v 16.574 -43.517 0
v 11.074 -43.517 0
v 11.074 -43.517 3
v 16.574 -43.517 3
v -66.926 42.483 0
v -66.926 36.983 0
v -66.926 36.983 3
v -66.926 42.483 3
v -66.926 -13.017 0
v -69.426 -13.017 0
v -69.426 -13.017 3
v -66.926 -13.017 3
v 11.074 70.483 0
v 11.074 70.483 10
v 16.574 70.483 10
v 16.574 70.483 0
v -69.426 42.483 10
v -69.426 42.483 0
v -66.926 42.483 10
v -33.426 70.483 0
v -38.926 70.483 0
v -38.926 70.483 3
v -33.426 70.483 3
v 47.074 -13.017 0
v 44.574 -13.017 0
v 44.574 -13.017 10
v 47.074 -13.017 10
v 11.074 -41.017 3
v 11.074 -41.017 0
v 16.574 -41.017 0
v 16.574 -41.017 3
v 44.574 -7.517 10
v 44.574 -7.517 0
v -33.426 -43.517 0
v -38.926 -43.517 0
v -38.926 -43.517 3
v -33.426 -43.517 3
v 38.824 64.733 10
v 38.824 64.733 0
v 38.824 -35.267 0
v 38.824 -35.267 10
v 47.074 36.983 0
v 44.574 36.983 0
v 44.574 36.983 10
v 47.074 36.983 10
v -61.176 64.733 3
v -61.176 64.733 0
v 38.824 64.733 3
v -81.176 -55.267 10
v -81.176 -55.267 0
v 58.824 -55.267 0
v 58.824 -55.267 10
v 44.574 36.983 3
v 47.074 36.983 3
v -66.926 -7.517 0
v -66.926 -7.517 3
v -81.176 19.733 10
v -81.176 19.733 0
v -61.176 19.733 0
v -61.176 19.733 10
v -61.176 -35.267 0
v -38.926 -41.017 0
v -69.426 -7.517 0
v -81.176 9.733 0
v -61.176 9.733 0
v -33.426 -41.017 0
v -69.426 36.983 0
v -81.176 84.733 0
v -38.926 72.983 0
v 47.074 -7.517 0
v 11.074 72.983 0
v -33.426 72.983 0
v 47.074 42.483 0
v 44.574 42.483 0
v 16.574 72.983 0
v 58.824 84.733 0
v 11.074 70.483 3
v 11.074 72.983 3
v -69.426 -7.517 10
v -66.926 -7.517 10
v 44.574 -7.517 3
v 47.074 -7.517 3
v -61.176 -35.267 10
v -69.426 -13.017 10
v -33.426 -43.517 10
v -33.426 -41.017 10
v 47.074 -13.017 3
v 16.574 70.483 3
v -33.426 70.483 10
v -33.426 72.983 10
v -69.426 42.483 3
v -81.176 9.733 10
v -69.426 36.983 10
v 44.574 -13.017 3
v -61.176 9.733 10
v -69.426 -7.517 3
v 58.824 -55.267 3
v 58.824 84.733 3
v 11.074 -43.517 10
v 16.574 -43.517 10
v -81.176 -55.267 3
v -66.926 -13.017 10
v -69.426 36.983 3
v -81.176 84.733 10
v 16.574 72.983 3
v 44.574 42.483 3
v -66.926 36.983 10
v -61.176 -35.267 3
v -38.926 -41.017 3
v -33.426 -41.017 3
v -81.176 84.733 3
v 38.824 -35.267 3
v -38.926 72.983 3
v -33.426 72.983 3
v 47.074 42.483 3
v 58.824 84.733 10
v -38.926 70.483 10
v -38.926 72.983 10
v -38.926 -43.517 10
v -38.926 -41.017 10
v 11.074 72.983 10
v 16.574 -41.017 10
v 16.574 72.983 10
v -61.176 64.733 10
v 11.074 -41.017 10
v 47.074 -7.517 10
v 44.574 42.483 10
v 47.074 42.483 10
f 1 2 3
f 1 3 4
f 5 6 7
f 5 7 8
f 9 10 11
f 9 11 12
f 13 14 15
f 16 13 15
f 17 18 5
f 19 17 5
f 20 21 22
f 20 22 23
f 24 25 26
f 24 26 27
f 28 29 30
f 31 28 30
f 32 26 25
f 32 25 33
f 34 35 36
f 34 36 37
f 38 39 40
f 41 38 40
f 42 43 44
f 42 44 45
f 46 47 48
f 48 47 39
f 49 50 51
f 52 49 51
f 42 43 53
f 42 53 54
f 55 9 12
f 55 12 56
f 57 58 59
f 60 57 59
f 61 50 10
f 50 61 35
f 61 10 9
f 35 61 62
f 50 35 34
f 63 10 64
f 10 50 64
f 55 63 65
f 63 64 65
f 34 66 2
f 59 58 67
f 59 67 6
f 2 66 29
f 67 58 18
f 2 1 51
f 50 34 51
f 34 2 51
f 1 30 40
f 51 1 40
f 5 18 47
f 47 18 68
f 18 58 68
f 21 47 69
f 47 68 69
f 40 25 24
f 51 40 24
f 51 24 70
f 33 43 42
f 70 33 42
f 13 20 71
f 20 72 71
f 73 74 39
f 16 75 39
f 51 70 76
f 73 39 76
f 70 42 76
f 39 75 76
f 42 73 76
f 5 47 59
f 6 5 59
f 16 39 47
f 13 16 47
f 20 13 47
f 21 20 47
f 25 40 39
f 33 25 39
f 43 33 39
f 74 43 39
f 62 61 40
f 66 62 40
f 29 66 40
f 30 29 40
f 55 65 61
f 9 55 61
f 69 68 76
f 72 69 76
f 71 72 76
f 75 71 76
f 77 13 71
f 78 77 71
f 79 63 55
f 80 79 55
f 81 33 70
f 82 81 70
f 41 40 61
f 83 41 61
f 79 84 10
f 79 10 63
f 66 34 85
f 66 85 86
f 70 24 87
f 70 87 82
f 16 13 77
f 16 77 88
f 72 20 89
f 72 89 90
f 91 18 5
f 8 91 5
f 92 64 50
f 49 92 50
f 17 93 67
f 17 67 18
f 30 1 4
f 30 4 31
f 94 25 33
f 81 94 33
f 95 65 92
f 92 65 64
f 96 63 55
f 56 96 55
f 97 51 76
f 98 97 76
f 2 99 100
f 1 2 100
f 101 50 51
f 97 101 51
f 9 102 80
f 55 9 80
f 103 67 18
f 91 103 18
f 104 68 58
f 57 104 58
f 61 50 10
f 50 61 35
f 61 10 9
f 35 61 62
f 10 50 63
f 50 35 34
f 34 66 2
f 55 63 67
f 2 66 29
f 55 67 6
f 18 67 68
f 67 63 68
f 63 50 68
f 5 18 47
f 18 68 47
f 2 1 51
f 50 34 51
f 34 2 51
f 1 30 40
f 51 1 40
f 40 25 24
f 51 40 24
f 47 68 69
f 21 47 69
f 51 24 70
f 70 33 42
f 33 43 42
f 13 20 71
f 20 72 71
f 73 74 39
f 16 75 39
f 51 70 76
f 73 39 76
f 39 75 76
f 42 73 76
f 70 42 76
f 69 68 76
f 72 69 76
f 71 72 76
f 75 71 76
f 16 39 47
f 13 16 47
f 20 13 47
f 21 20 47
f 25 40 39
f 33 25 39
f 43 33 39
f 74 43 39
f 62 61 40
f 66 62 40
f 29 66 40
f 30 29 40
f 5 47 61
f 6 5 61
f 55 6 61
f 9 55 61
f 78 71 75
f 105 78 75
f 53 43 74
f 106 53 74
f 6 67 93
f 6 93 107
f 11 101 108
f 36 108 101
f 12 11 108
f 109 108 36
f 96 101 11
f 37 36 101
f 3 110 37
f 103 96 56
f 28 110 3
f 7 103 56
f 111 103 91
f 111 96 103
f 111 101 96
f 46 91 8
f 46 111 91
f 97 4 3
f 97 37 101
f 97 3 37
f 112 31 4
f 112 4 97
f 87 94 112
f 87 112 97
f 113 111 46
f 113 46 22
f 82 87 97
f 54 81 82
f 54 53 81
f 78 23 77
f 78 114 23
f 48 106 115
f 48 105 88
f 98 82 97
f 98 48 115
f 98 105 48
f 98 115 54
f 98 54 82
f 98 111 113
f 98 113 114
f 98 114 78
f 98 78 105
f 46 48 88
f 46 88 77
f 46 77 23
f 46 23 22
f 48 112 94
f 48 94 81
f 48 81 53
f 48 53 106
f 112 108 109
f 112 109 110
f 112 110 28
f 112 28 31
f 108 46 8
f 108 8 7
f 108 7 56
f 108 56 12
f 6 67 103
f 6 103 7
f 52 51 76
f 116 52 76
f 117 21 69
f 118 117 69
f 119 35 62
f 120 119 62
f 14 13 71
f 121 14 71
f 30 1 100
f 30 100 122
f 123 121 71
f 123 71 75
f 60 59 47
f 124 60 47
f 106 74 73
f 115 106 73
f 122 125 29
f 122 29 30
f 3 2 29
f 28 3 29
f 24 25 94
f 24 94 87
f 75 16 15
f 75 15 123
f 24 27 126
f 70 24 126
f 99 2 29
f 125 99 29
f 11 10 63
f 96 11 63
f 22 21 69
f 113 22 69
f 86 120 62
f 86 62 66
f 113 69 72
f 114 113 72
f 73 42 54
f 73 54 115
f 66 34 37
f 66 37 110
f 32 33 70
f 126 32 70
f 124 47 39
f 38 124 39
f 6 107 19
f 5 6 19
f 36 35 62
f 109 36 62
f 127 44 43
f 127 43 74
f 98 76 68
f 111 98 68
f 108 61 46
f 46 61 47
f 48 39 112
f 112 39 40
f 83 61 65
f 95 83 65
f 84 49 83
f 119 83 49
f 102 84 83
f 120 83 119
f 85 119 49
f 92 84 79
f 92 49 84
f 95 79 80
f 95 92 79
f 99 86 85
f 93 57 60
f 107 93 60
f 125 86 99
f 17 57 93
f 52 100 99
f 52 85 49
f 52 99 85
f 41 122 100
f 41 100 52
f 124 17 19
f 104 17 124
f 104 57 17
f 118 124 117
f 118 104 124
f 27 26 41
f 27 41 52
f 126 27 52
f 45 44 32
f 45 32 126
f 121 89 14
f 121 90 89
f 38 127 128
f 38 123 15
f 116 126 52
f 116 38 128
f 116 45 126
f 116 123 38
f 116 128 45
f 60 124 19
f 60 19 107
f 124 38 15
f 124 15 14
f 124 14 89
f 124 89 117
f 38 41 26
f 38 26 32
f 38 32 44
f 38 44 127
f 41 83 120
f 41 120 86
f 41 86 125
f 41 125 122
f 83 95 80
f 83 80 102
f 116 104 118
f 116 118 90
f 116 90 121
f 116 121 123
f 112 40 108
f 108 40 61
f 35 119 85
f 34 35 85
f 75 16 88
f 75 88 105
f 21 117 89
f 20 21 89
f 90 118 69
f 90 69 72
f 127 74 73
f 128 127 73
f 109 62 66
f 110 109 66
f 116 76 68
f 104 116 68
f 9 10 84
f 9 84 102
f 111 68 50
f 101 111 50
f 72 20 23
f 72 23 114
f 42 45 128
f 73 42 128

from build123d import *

# Parameters (mm, degrees)
F0_W     = 5.5
F0_H     = 2.5
F0_W_2   = 2.5
F0_H_2   = 5.5
F0_W_3   = 15
F0_H_3   = 10
F0_W_4   = 5
F1_DEPTH = 3
F2_DEPTH = 10


with BuildPart() as f1:
    # F0 (on Top) → F1 (new body)
    with BuildSketch(Plane.XY):
        Polygon((-61.175863, 19.733036), (-61.175863, 64.733036), (38.824137, 64.733036), (38.824137, -35.266964), (-61.175863, -35.266964), (-61.175863, 9.733036), (-76.175863, 9.733036), (-76.175863, -50.266964), (53.824137, -50.266964), (53.824137, 79.733036), (-76.175863, 79.733036), (-76.175863, 19.733036), align=None)
        with Locations((-36.175863, -42.266964)):
            Rectangle(F0_W, F0_H, mode=Mode.SUBTRACT)
        with Locations((-68.175863, -10.266964)):
            Rectangle(F0_W_2, F0_H_2, mode=Mode.SUBTRACT)
        with Locations((13.824137, -42.266964)):
            Rectangle(F0_W, F0_H, mode=Mode.SUBTRACT)
        with Locations((45.824137, -10.266964)):
            Rectangle(F0_W_2, F0_H_2, mode=Mode.SUBTRACT)
        with Locations((-68.175863, 39.733036)):
            Rectangle(F0_W_2, F0_H_2, mode=Mode.SUBTRACT)
        with Locations((-36.175863, 71.733036)):
            Rectangle(F0_W, F0_H, mode=Mode.SUBTRACT)
        with Locations((45.824137, 39.733036)):
            Rectangle(F0_W_2, F0_H_2, mode=Mode.SUBTRACT)
        with Locations((13.824137, 71.733036)):
            Rectangle(F0_W, F0_H, mode=Mode.SUBTRACT)
        Polygon((-81.175863, 19.733036), (-76.175863, 19.733036), (-76.175863, 79.733036), (53.824137, 79.733036), (53.824137, -50.266964), (-76.175863, -50.266964), (-76.175863, 9.733036), (-81.175863, 9.733036), (-81.175863, -55.266964), (58.824137, -55.266964), (58.824137, 84.733036), (-81.175863, 84.733036), align=None)
        with Locations((-68.675863, 14.733036)):
            Rectangle(F0_W_3, F0_H_3)
        with Locations((-78.675863, 14.733036)):
            Rectangle(F0_W_4, F0_H_3)
    extrude(amount=F1_DEPTH)


with BuildPart() as f2:
    # F0 (on Top) → F2 (new body)
    with BuildSketch(Plane.XY):
        Polygon((-61.175863, 19.733036), (-61.175863, 64.733036), (38.824137, 64.733036), (38.824137, -35.266964), (-61.175863, -35.266964), (-61.175863, 9.733036), (-76.175863, 9.733036), (-76.175863, -50.266964), (53.824137, -50.266964), (53.824137, 79.733036), (-76.175863, 79.733036), (-76.175863, 19.733036), align=None)
        with Locations((-36.175863, -42.266964)):
            Rectangle(F0_W, F0_H, mode=Mode.SUBTRACT)
        with Locations((-68.175863, -10.266964)):
            Rectangle(F0_W_2, F0_H_2, mode=Mode.SUBTRACT)
        with Locations((13.824137, -42.266964)):
            Rectangle(F0_W, F0_H, mode=Mode.SUBTRACT)
        with Locations((45.824137, -10.266964)):
            Rectangle(F0_W_2, F0_H_2, mode=Mode.SUBTRACT)
        with Locations((-68.175863, 39.733036)):
            Rectangle(F0_W_2, F0_H_2, mode=Mode.SUBTRACT)
        with Locations((-36.175863, 71.733036)):
            Rectangle(F0_W, F0_H, mode=Mode.SUBTRACT)
        with Locations((45.824137, 39.733036)):
            Rectangle(F0_W_2, F0_H_2, mode=Mode.SUBTRACT)
        with Locations((13.824137, 71.733036)):
            Rectangle(F0_W, F0_H, mode=Mode.SUBTRACT)
        Polygon((-81.175863, 19.733036), (-76.175863, 19.733036), (-76.175863, 79.733036), (53.824137, 79.733036), (53.824137, -50.266964), (-76.175863, -50.266964), (-76.175863, 9.733036), (-81.175863, 9.733036), (-81.175863, -55.266964), (58.824137, -55.266964), (58.824137, 84.733036), (-81.175863, 84.733036), align=None)
    extrude(amount=F2_DEPTH)


solid = Compound([f1.part, f2.part])
